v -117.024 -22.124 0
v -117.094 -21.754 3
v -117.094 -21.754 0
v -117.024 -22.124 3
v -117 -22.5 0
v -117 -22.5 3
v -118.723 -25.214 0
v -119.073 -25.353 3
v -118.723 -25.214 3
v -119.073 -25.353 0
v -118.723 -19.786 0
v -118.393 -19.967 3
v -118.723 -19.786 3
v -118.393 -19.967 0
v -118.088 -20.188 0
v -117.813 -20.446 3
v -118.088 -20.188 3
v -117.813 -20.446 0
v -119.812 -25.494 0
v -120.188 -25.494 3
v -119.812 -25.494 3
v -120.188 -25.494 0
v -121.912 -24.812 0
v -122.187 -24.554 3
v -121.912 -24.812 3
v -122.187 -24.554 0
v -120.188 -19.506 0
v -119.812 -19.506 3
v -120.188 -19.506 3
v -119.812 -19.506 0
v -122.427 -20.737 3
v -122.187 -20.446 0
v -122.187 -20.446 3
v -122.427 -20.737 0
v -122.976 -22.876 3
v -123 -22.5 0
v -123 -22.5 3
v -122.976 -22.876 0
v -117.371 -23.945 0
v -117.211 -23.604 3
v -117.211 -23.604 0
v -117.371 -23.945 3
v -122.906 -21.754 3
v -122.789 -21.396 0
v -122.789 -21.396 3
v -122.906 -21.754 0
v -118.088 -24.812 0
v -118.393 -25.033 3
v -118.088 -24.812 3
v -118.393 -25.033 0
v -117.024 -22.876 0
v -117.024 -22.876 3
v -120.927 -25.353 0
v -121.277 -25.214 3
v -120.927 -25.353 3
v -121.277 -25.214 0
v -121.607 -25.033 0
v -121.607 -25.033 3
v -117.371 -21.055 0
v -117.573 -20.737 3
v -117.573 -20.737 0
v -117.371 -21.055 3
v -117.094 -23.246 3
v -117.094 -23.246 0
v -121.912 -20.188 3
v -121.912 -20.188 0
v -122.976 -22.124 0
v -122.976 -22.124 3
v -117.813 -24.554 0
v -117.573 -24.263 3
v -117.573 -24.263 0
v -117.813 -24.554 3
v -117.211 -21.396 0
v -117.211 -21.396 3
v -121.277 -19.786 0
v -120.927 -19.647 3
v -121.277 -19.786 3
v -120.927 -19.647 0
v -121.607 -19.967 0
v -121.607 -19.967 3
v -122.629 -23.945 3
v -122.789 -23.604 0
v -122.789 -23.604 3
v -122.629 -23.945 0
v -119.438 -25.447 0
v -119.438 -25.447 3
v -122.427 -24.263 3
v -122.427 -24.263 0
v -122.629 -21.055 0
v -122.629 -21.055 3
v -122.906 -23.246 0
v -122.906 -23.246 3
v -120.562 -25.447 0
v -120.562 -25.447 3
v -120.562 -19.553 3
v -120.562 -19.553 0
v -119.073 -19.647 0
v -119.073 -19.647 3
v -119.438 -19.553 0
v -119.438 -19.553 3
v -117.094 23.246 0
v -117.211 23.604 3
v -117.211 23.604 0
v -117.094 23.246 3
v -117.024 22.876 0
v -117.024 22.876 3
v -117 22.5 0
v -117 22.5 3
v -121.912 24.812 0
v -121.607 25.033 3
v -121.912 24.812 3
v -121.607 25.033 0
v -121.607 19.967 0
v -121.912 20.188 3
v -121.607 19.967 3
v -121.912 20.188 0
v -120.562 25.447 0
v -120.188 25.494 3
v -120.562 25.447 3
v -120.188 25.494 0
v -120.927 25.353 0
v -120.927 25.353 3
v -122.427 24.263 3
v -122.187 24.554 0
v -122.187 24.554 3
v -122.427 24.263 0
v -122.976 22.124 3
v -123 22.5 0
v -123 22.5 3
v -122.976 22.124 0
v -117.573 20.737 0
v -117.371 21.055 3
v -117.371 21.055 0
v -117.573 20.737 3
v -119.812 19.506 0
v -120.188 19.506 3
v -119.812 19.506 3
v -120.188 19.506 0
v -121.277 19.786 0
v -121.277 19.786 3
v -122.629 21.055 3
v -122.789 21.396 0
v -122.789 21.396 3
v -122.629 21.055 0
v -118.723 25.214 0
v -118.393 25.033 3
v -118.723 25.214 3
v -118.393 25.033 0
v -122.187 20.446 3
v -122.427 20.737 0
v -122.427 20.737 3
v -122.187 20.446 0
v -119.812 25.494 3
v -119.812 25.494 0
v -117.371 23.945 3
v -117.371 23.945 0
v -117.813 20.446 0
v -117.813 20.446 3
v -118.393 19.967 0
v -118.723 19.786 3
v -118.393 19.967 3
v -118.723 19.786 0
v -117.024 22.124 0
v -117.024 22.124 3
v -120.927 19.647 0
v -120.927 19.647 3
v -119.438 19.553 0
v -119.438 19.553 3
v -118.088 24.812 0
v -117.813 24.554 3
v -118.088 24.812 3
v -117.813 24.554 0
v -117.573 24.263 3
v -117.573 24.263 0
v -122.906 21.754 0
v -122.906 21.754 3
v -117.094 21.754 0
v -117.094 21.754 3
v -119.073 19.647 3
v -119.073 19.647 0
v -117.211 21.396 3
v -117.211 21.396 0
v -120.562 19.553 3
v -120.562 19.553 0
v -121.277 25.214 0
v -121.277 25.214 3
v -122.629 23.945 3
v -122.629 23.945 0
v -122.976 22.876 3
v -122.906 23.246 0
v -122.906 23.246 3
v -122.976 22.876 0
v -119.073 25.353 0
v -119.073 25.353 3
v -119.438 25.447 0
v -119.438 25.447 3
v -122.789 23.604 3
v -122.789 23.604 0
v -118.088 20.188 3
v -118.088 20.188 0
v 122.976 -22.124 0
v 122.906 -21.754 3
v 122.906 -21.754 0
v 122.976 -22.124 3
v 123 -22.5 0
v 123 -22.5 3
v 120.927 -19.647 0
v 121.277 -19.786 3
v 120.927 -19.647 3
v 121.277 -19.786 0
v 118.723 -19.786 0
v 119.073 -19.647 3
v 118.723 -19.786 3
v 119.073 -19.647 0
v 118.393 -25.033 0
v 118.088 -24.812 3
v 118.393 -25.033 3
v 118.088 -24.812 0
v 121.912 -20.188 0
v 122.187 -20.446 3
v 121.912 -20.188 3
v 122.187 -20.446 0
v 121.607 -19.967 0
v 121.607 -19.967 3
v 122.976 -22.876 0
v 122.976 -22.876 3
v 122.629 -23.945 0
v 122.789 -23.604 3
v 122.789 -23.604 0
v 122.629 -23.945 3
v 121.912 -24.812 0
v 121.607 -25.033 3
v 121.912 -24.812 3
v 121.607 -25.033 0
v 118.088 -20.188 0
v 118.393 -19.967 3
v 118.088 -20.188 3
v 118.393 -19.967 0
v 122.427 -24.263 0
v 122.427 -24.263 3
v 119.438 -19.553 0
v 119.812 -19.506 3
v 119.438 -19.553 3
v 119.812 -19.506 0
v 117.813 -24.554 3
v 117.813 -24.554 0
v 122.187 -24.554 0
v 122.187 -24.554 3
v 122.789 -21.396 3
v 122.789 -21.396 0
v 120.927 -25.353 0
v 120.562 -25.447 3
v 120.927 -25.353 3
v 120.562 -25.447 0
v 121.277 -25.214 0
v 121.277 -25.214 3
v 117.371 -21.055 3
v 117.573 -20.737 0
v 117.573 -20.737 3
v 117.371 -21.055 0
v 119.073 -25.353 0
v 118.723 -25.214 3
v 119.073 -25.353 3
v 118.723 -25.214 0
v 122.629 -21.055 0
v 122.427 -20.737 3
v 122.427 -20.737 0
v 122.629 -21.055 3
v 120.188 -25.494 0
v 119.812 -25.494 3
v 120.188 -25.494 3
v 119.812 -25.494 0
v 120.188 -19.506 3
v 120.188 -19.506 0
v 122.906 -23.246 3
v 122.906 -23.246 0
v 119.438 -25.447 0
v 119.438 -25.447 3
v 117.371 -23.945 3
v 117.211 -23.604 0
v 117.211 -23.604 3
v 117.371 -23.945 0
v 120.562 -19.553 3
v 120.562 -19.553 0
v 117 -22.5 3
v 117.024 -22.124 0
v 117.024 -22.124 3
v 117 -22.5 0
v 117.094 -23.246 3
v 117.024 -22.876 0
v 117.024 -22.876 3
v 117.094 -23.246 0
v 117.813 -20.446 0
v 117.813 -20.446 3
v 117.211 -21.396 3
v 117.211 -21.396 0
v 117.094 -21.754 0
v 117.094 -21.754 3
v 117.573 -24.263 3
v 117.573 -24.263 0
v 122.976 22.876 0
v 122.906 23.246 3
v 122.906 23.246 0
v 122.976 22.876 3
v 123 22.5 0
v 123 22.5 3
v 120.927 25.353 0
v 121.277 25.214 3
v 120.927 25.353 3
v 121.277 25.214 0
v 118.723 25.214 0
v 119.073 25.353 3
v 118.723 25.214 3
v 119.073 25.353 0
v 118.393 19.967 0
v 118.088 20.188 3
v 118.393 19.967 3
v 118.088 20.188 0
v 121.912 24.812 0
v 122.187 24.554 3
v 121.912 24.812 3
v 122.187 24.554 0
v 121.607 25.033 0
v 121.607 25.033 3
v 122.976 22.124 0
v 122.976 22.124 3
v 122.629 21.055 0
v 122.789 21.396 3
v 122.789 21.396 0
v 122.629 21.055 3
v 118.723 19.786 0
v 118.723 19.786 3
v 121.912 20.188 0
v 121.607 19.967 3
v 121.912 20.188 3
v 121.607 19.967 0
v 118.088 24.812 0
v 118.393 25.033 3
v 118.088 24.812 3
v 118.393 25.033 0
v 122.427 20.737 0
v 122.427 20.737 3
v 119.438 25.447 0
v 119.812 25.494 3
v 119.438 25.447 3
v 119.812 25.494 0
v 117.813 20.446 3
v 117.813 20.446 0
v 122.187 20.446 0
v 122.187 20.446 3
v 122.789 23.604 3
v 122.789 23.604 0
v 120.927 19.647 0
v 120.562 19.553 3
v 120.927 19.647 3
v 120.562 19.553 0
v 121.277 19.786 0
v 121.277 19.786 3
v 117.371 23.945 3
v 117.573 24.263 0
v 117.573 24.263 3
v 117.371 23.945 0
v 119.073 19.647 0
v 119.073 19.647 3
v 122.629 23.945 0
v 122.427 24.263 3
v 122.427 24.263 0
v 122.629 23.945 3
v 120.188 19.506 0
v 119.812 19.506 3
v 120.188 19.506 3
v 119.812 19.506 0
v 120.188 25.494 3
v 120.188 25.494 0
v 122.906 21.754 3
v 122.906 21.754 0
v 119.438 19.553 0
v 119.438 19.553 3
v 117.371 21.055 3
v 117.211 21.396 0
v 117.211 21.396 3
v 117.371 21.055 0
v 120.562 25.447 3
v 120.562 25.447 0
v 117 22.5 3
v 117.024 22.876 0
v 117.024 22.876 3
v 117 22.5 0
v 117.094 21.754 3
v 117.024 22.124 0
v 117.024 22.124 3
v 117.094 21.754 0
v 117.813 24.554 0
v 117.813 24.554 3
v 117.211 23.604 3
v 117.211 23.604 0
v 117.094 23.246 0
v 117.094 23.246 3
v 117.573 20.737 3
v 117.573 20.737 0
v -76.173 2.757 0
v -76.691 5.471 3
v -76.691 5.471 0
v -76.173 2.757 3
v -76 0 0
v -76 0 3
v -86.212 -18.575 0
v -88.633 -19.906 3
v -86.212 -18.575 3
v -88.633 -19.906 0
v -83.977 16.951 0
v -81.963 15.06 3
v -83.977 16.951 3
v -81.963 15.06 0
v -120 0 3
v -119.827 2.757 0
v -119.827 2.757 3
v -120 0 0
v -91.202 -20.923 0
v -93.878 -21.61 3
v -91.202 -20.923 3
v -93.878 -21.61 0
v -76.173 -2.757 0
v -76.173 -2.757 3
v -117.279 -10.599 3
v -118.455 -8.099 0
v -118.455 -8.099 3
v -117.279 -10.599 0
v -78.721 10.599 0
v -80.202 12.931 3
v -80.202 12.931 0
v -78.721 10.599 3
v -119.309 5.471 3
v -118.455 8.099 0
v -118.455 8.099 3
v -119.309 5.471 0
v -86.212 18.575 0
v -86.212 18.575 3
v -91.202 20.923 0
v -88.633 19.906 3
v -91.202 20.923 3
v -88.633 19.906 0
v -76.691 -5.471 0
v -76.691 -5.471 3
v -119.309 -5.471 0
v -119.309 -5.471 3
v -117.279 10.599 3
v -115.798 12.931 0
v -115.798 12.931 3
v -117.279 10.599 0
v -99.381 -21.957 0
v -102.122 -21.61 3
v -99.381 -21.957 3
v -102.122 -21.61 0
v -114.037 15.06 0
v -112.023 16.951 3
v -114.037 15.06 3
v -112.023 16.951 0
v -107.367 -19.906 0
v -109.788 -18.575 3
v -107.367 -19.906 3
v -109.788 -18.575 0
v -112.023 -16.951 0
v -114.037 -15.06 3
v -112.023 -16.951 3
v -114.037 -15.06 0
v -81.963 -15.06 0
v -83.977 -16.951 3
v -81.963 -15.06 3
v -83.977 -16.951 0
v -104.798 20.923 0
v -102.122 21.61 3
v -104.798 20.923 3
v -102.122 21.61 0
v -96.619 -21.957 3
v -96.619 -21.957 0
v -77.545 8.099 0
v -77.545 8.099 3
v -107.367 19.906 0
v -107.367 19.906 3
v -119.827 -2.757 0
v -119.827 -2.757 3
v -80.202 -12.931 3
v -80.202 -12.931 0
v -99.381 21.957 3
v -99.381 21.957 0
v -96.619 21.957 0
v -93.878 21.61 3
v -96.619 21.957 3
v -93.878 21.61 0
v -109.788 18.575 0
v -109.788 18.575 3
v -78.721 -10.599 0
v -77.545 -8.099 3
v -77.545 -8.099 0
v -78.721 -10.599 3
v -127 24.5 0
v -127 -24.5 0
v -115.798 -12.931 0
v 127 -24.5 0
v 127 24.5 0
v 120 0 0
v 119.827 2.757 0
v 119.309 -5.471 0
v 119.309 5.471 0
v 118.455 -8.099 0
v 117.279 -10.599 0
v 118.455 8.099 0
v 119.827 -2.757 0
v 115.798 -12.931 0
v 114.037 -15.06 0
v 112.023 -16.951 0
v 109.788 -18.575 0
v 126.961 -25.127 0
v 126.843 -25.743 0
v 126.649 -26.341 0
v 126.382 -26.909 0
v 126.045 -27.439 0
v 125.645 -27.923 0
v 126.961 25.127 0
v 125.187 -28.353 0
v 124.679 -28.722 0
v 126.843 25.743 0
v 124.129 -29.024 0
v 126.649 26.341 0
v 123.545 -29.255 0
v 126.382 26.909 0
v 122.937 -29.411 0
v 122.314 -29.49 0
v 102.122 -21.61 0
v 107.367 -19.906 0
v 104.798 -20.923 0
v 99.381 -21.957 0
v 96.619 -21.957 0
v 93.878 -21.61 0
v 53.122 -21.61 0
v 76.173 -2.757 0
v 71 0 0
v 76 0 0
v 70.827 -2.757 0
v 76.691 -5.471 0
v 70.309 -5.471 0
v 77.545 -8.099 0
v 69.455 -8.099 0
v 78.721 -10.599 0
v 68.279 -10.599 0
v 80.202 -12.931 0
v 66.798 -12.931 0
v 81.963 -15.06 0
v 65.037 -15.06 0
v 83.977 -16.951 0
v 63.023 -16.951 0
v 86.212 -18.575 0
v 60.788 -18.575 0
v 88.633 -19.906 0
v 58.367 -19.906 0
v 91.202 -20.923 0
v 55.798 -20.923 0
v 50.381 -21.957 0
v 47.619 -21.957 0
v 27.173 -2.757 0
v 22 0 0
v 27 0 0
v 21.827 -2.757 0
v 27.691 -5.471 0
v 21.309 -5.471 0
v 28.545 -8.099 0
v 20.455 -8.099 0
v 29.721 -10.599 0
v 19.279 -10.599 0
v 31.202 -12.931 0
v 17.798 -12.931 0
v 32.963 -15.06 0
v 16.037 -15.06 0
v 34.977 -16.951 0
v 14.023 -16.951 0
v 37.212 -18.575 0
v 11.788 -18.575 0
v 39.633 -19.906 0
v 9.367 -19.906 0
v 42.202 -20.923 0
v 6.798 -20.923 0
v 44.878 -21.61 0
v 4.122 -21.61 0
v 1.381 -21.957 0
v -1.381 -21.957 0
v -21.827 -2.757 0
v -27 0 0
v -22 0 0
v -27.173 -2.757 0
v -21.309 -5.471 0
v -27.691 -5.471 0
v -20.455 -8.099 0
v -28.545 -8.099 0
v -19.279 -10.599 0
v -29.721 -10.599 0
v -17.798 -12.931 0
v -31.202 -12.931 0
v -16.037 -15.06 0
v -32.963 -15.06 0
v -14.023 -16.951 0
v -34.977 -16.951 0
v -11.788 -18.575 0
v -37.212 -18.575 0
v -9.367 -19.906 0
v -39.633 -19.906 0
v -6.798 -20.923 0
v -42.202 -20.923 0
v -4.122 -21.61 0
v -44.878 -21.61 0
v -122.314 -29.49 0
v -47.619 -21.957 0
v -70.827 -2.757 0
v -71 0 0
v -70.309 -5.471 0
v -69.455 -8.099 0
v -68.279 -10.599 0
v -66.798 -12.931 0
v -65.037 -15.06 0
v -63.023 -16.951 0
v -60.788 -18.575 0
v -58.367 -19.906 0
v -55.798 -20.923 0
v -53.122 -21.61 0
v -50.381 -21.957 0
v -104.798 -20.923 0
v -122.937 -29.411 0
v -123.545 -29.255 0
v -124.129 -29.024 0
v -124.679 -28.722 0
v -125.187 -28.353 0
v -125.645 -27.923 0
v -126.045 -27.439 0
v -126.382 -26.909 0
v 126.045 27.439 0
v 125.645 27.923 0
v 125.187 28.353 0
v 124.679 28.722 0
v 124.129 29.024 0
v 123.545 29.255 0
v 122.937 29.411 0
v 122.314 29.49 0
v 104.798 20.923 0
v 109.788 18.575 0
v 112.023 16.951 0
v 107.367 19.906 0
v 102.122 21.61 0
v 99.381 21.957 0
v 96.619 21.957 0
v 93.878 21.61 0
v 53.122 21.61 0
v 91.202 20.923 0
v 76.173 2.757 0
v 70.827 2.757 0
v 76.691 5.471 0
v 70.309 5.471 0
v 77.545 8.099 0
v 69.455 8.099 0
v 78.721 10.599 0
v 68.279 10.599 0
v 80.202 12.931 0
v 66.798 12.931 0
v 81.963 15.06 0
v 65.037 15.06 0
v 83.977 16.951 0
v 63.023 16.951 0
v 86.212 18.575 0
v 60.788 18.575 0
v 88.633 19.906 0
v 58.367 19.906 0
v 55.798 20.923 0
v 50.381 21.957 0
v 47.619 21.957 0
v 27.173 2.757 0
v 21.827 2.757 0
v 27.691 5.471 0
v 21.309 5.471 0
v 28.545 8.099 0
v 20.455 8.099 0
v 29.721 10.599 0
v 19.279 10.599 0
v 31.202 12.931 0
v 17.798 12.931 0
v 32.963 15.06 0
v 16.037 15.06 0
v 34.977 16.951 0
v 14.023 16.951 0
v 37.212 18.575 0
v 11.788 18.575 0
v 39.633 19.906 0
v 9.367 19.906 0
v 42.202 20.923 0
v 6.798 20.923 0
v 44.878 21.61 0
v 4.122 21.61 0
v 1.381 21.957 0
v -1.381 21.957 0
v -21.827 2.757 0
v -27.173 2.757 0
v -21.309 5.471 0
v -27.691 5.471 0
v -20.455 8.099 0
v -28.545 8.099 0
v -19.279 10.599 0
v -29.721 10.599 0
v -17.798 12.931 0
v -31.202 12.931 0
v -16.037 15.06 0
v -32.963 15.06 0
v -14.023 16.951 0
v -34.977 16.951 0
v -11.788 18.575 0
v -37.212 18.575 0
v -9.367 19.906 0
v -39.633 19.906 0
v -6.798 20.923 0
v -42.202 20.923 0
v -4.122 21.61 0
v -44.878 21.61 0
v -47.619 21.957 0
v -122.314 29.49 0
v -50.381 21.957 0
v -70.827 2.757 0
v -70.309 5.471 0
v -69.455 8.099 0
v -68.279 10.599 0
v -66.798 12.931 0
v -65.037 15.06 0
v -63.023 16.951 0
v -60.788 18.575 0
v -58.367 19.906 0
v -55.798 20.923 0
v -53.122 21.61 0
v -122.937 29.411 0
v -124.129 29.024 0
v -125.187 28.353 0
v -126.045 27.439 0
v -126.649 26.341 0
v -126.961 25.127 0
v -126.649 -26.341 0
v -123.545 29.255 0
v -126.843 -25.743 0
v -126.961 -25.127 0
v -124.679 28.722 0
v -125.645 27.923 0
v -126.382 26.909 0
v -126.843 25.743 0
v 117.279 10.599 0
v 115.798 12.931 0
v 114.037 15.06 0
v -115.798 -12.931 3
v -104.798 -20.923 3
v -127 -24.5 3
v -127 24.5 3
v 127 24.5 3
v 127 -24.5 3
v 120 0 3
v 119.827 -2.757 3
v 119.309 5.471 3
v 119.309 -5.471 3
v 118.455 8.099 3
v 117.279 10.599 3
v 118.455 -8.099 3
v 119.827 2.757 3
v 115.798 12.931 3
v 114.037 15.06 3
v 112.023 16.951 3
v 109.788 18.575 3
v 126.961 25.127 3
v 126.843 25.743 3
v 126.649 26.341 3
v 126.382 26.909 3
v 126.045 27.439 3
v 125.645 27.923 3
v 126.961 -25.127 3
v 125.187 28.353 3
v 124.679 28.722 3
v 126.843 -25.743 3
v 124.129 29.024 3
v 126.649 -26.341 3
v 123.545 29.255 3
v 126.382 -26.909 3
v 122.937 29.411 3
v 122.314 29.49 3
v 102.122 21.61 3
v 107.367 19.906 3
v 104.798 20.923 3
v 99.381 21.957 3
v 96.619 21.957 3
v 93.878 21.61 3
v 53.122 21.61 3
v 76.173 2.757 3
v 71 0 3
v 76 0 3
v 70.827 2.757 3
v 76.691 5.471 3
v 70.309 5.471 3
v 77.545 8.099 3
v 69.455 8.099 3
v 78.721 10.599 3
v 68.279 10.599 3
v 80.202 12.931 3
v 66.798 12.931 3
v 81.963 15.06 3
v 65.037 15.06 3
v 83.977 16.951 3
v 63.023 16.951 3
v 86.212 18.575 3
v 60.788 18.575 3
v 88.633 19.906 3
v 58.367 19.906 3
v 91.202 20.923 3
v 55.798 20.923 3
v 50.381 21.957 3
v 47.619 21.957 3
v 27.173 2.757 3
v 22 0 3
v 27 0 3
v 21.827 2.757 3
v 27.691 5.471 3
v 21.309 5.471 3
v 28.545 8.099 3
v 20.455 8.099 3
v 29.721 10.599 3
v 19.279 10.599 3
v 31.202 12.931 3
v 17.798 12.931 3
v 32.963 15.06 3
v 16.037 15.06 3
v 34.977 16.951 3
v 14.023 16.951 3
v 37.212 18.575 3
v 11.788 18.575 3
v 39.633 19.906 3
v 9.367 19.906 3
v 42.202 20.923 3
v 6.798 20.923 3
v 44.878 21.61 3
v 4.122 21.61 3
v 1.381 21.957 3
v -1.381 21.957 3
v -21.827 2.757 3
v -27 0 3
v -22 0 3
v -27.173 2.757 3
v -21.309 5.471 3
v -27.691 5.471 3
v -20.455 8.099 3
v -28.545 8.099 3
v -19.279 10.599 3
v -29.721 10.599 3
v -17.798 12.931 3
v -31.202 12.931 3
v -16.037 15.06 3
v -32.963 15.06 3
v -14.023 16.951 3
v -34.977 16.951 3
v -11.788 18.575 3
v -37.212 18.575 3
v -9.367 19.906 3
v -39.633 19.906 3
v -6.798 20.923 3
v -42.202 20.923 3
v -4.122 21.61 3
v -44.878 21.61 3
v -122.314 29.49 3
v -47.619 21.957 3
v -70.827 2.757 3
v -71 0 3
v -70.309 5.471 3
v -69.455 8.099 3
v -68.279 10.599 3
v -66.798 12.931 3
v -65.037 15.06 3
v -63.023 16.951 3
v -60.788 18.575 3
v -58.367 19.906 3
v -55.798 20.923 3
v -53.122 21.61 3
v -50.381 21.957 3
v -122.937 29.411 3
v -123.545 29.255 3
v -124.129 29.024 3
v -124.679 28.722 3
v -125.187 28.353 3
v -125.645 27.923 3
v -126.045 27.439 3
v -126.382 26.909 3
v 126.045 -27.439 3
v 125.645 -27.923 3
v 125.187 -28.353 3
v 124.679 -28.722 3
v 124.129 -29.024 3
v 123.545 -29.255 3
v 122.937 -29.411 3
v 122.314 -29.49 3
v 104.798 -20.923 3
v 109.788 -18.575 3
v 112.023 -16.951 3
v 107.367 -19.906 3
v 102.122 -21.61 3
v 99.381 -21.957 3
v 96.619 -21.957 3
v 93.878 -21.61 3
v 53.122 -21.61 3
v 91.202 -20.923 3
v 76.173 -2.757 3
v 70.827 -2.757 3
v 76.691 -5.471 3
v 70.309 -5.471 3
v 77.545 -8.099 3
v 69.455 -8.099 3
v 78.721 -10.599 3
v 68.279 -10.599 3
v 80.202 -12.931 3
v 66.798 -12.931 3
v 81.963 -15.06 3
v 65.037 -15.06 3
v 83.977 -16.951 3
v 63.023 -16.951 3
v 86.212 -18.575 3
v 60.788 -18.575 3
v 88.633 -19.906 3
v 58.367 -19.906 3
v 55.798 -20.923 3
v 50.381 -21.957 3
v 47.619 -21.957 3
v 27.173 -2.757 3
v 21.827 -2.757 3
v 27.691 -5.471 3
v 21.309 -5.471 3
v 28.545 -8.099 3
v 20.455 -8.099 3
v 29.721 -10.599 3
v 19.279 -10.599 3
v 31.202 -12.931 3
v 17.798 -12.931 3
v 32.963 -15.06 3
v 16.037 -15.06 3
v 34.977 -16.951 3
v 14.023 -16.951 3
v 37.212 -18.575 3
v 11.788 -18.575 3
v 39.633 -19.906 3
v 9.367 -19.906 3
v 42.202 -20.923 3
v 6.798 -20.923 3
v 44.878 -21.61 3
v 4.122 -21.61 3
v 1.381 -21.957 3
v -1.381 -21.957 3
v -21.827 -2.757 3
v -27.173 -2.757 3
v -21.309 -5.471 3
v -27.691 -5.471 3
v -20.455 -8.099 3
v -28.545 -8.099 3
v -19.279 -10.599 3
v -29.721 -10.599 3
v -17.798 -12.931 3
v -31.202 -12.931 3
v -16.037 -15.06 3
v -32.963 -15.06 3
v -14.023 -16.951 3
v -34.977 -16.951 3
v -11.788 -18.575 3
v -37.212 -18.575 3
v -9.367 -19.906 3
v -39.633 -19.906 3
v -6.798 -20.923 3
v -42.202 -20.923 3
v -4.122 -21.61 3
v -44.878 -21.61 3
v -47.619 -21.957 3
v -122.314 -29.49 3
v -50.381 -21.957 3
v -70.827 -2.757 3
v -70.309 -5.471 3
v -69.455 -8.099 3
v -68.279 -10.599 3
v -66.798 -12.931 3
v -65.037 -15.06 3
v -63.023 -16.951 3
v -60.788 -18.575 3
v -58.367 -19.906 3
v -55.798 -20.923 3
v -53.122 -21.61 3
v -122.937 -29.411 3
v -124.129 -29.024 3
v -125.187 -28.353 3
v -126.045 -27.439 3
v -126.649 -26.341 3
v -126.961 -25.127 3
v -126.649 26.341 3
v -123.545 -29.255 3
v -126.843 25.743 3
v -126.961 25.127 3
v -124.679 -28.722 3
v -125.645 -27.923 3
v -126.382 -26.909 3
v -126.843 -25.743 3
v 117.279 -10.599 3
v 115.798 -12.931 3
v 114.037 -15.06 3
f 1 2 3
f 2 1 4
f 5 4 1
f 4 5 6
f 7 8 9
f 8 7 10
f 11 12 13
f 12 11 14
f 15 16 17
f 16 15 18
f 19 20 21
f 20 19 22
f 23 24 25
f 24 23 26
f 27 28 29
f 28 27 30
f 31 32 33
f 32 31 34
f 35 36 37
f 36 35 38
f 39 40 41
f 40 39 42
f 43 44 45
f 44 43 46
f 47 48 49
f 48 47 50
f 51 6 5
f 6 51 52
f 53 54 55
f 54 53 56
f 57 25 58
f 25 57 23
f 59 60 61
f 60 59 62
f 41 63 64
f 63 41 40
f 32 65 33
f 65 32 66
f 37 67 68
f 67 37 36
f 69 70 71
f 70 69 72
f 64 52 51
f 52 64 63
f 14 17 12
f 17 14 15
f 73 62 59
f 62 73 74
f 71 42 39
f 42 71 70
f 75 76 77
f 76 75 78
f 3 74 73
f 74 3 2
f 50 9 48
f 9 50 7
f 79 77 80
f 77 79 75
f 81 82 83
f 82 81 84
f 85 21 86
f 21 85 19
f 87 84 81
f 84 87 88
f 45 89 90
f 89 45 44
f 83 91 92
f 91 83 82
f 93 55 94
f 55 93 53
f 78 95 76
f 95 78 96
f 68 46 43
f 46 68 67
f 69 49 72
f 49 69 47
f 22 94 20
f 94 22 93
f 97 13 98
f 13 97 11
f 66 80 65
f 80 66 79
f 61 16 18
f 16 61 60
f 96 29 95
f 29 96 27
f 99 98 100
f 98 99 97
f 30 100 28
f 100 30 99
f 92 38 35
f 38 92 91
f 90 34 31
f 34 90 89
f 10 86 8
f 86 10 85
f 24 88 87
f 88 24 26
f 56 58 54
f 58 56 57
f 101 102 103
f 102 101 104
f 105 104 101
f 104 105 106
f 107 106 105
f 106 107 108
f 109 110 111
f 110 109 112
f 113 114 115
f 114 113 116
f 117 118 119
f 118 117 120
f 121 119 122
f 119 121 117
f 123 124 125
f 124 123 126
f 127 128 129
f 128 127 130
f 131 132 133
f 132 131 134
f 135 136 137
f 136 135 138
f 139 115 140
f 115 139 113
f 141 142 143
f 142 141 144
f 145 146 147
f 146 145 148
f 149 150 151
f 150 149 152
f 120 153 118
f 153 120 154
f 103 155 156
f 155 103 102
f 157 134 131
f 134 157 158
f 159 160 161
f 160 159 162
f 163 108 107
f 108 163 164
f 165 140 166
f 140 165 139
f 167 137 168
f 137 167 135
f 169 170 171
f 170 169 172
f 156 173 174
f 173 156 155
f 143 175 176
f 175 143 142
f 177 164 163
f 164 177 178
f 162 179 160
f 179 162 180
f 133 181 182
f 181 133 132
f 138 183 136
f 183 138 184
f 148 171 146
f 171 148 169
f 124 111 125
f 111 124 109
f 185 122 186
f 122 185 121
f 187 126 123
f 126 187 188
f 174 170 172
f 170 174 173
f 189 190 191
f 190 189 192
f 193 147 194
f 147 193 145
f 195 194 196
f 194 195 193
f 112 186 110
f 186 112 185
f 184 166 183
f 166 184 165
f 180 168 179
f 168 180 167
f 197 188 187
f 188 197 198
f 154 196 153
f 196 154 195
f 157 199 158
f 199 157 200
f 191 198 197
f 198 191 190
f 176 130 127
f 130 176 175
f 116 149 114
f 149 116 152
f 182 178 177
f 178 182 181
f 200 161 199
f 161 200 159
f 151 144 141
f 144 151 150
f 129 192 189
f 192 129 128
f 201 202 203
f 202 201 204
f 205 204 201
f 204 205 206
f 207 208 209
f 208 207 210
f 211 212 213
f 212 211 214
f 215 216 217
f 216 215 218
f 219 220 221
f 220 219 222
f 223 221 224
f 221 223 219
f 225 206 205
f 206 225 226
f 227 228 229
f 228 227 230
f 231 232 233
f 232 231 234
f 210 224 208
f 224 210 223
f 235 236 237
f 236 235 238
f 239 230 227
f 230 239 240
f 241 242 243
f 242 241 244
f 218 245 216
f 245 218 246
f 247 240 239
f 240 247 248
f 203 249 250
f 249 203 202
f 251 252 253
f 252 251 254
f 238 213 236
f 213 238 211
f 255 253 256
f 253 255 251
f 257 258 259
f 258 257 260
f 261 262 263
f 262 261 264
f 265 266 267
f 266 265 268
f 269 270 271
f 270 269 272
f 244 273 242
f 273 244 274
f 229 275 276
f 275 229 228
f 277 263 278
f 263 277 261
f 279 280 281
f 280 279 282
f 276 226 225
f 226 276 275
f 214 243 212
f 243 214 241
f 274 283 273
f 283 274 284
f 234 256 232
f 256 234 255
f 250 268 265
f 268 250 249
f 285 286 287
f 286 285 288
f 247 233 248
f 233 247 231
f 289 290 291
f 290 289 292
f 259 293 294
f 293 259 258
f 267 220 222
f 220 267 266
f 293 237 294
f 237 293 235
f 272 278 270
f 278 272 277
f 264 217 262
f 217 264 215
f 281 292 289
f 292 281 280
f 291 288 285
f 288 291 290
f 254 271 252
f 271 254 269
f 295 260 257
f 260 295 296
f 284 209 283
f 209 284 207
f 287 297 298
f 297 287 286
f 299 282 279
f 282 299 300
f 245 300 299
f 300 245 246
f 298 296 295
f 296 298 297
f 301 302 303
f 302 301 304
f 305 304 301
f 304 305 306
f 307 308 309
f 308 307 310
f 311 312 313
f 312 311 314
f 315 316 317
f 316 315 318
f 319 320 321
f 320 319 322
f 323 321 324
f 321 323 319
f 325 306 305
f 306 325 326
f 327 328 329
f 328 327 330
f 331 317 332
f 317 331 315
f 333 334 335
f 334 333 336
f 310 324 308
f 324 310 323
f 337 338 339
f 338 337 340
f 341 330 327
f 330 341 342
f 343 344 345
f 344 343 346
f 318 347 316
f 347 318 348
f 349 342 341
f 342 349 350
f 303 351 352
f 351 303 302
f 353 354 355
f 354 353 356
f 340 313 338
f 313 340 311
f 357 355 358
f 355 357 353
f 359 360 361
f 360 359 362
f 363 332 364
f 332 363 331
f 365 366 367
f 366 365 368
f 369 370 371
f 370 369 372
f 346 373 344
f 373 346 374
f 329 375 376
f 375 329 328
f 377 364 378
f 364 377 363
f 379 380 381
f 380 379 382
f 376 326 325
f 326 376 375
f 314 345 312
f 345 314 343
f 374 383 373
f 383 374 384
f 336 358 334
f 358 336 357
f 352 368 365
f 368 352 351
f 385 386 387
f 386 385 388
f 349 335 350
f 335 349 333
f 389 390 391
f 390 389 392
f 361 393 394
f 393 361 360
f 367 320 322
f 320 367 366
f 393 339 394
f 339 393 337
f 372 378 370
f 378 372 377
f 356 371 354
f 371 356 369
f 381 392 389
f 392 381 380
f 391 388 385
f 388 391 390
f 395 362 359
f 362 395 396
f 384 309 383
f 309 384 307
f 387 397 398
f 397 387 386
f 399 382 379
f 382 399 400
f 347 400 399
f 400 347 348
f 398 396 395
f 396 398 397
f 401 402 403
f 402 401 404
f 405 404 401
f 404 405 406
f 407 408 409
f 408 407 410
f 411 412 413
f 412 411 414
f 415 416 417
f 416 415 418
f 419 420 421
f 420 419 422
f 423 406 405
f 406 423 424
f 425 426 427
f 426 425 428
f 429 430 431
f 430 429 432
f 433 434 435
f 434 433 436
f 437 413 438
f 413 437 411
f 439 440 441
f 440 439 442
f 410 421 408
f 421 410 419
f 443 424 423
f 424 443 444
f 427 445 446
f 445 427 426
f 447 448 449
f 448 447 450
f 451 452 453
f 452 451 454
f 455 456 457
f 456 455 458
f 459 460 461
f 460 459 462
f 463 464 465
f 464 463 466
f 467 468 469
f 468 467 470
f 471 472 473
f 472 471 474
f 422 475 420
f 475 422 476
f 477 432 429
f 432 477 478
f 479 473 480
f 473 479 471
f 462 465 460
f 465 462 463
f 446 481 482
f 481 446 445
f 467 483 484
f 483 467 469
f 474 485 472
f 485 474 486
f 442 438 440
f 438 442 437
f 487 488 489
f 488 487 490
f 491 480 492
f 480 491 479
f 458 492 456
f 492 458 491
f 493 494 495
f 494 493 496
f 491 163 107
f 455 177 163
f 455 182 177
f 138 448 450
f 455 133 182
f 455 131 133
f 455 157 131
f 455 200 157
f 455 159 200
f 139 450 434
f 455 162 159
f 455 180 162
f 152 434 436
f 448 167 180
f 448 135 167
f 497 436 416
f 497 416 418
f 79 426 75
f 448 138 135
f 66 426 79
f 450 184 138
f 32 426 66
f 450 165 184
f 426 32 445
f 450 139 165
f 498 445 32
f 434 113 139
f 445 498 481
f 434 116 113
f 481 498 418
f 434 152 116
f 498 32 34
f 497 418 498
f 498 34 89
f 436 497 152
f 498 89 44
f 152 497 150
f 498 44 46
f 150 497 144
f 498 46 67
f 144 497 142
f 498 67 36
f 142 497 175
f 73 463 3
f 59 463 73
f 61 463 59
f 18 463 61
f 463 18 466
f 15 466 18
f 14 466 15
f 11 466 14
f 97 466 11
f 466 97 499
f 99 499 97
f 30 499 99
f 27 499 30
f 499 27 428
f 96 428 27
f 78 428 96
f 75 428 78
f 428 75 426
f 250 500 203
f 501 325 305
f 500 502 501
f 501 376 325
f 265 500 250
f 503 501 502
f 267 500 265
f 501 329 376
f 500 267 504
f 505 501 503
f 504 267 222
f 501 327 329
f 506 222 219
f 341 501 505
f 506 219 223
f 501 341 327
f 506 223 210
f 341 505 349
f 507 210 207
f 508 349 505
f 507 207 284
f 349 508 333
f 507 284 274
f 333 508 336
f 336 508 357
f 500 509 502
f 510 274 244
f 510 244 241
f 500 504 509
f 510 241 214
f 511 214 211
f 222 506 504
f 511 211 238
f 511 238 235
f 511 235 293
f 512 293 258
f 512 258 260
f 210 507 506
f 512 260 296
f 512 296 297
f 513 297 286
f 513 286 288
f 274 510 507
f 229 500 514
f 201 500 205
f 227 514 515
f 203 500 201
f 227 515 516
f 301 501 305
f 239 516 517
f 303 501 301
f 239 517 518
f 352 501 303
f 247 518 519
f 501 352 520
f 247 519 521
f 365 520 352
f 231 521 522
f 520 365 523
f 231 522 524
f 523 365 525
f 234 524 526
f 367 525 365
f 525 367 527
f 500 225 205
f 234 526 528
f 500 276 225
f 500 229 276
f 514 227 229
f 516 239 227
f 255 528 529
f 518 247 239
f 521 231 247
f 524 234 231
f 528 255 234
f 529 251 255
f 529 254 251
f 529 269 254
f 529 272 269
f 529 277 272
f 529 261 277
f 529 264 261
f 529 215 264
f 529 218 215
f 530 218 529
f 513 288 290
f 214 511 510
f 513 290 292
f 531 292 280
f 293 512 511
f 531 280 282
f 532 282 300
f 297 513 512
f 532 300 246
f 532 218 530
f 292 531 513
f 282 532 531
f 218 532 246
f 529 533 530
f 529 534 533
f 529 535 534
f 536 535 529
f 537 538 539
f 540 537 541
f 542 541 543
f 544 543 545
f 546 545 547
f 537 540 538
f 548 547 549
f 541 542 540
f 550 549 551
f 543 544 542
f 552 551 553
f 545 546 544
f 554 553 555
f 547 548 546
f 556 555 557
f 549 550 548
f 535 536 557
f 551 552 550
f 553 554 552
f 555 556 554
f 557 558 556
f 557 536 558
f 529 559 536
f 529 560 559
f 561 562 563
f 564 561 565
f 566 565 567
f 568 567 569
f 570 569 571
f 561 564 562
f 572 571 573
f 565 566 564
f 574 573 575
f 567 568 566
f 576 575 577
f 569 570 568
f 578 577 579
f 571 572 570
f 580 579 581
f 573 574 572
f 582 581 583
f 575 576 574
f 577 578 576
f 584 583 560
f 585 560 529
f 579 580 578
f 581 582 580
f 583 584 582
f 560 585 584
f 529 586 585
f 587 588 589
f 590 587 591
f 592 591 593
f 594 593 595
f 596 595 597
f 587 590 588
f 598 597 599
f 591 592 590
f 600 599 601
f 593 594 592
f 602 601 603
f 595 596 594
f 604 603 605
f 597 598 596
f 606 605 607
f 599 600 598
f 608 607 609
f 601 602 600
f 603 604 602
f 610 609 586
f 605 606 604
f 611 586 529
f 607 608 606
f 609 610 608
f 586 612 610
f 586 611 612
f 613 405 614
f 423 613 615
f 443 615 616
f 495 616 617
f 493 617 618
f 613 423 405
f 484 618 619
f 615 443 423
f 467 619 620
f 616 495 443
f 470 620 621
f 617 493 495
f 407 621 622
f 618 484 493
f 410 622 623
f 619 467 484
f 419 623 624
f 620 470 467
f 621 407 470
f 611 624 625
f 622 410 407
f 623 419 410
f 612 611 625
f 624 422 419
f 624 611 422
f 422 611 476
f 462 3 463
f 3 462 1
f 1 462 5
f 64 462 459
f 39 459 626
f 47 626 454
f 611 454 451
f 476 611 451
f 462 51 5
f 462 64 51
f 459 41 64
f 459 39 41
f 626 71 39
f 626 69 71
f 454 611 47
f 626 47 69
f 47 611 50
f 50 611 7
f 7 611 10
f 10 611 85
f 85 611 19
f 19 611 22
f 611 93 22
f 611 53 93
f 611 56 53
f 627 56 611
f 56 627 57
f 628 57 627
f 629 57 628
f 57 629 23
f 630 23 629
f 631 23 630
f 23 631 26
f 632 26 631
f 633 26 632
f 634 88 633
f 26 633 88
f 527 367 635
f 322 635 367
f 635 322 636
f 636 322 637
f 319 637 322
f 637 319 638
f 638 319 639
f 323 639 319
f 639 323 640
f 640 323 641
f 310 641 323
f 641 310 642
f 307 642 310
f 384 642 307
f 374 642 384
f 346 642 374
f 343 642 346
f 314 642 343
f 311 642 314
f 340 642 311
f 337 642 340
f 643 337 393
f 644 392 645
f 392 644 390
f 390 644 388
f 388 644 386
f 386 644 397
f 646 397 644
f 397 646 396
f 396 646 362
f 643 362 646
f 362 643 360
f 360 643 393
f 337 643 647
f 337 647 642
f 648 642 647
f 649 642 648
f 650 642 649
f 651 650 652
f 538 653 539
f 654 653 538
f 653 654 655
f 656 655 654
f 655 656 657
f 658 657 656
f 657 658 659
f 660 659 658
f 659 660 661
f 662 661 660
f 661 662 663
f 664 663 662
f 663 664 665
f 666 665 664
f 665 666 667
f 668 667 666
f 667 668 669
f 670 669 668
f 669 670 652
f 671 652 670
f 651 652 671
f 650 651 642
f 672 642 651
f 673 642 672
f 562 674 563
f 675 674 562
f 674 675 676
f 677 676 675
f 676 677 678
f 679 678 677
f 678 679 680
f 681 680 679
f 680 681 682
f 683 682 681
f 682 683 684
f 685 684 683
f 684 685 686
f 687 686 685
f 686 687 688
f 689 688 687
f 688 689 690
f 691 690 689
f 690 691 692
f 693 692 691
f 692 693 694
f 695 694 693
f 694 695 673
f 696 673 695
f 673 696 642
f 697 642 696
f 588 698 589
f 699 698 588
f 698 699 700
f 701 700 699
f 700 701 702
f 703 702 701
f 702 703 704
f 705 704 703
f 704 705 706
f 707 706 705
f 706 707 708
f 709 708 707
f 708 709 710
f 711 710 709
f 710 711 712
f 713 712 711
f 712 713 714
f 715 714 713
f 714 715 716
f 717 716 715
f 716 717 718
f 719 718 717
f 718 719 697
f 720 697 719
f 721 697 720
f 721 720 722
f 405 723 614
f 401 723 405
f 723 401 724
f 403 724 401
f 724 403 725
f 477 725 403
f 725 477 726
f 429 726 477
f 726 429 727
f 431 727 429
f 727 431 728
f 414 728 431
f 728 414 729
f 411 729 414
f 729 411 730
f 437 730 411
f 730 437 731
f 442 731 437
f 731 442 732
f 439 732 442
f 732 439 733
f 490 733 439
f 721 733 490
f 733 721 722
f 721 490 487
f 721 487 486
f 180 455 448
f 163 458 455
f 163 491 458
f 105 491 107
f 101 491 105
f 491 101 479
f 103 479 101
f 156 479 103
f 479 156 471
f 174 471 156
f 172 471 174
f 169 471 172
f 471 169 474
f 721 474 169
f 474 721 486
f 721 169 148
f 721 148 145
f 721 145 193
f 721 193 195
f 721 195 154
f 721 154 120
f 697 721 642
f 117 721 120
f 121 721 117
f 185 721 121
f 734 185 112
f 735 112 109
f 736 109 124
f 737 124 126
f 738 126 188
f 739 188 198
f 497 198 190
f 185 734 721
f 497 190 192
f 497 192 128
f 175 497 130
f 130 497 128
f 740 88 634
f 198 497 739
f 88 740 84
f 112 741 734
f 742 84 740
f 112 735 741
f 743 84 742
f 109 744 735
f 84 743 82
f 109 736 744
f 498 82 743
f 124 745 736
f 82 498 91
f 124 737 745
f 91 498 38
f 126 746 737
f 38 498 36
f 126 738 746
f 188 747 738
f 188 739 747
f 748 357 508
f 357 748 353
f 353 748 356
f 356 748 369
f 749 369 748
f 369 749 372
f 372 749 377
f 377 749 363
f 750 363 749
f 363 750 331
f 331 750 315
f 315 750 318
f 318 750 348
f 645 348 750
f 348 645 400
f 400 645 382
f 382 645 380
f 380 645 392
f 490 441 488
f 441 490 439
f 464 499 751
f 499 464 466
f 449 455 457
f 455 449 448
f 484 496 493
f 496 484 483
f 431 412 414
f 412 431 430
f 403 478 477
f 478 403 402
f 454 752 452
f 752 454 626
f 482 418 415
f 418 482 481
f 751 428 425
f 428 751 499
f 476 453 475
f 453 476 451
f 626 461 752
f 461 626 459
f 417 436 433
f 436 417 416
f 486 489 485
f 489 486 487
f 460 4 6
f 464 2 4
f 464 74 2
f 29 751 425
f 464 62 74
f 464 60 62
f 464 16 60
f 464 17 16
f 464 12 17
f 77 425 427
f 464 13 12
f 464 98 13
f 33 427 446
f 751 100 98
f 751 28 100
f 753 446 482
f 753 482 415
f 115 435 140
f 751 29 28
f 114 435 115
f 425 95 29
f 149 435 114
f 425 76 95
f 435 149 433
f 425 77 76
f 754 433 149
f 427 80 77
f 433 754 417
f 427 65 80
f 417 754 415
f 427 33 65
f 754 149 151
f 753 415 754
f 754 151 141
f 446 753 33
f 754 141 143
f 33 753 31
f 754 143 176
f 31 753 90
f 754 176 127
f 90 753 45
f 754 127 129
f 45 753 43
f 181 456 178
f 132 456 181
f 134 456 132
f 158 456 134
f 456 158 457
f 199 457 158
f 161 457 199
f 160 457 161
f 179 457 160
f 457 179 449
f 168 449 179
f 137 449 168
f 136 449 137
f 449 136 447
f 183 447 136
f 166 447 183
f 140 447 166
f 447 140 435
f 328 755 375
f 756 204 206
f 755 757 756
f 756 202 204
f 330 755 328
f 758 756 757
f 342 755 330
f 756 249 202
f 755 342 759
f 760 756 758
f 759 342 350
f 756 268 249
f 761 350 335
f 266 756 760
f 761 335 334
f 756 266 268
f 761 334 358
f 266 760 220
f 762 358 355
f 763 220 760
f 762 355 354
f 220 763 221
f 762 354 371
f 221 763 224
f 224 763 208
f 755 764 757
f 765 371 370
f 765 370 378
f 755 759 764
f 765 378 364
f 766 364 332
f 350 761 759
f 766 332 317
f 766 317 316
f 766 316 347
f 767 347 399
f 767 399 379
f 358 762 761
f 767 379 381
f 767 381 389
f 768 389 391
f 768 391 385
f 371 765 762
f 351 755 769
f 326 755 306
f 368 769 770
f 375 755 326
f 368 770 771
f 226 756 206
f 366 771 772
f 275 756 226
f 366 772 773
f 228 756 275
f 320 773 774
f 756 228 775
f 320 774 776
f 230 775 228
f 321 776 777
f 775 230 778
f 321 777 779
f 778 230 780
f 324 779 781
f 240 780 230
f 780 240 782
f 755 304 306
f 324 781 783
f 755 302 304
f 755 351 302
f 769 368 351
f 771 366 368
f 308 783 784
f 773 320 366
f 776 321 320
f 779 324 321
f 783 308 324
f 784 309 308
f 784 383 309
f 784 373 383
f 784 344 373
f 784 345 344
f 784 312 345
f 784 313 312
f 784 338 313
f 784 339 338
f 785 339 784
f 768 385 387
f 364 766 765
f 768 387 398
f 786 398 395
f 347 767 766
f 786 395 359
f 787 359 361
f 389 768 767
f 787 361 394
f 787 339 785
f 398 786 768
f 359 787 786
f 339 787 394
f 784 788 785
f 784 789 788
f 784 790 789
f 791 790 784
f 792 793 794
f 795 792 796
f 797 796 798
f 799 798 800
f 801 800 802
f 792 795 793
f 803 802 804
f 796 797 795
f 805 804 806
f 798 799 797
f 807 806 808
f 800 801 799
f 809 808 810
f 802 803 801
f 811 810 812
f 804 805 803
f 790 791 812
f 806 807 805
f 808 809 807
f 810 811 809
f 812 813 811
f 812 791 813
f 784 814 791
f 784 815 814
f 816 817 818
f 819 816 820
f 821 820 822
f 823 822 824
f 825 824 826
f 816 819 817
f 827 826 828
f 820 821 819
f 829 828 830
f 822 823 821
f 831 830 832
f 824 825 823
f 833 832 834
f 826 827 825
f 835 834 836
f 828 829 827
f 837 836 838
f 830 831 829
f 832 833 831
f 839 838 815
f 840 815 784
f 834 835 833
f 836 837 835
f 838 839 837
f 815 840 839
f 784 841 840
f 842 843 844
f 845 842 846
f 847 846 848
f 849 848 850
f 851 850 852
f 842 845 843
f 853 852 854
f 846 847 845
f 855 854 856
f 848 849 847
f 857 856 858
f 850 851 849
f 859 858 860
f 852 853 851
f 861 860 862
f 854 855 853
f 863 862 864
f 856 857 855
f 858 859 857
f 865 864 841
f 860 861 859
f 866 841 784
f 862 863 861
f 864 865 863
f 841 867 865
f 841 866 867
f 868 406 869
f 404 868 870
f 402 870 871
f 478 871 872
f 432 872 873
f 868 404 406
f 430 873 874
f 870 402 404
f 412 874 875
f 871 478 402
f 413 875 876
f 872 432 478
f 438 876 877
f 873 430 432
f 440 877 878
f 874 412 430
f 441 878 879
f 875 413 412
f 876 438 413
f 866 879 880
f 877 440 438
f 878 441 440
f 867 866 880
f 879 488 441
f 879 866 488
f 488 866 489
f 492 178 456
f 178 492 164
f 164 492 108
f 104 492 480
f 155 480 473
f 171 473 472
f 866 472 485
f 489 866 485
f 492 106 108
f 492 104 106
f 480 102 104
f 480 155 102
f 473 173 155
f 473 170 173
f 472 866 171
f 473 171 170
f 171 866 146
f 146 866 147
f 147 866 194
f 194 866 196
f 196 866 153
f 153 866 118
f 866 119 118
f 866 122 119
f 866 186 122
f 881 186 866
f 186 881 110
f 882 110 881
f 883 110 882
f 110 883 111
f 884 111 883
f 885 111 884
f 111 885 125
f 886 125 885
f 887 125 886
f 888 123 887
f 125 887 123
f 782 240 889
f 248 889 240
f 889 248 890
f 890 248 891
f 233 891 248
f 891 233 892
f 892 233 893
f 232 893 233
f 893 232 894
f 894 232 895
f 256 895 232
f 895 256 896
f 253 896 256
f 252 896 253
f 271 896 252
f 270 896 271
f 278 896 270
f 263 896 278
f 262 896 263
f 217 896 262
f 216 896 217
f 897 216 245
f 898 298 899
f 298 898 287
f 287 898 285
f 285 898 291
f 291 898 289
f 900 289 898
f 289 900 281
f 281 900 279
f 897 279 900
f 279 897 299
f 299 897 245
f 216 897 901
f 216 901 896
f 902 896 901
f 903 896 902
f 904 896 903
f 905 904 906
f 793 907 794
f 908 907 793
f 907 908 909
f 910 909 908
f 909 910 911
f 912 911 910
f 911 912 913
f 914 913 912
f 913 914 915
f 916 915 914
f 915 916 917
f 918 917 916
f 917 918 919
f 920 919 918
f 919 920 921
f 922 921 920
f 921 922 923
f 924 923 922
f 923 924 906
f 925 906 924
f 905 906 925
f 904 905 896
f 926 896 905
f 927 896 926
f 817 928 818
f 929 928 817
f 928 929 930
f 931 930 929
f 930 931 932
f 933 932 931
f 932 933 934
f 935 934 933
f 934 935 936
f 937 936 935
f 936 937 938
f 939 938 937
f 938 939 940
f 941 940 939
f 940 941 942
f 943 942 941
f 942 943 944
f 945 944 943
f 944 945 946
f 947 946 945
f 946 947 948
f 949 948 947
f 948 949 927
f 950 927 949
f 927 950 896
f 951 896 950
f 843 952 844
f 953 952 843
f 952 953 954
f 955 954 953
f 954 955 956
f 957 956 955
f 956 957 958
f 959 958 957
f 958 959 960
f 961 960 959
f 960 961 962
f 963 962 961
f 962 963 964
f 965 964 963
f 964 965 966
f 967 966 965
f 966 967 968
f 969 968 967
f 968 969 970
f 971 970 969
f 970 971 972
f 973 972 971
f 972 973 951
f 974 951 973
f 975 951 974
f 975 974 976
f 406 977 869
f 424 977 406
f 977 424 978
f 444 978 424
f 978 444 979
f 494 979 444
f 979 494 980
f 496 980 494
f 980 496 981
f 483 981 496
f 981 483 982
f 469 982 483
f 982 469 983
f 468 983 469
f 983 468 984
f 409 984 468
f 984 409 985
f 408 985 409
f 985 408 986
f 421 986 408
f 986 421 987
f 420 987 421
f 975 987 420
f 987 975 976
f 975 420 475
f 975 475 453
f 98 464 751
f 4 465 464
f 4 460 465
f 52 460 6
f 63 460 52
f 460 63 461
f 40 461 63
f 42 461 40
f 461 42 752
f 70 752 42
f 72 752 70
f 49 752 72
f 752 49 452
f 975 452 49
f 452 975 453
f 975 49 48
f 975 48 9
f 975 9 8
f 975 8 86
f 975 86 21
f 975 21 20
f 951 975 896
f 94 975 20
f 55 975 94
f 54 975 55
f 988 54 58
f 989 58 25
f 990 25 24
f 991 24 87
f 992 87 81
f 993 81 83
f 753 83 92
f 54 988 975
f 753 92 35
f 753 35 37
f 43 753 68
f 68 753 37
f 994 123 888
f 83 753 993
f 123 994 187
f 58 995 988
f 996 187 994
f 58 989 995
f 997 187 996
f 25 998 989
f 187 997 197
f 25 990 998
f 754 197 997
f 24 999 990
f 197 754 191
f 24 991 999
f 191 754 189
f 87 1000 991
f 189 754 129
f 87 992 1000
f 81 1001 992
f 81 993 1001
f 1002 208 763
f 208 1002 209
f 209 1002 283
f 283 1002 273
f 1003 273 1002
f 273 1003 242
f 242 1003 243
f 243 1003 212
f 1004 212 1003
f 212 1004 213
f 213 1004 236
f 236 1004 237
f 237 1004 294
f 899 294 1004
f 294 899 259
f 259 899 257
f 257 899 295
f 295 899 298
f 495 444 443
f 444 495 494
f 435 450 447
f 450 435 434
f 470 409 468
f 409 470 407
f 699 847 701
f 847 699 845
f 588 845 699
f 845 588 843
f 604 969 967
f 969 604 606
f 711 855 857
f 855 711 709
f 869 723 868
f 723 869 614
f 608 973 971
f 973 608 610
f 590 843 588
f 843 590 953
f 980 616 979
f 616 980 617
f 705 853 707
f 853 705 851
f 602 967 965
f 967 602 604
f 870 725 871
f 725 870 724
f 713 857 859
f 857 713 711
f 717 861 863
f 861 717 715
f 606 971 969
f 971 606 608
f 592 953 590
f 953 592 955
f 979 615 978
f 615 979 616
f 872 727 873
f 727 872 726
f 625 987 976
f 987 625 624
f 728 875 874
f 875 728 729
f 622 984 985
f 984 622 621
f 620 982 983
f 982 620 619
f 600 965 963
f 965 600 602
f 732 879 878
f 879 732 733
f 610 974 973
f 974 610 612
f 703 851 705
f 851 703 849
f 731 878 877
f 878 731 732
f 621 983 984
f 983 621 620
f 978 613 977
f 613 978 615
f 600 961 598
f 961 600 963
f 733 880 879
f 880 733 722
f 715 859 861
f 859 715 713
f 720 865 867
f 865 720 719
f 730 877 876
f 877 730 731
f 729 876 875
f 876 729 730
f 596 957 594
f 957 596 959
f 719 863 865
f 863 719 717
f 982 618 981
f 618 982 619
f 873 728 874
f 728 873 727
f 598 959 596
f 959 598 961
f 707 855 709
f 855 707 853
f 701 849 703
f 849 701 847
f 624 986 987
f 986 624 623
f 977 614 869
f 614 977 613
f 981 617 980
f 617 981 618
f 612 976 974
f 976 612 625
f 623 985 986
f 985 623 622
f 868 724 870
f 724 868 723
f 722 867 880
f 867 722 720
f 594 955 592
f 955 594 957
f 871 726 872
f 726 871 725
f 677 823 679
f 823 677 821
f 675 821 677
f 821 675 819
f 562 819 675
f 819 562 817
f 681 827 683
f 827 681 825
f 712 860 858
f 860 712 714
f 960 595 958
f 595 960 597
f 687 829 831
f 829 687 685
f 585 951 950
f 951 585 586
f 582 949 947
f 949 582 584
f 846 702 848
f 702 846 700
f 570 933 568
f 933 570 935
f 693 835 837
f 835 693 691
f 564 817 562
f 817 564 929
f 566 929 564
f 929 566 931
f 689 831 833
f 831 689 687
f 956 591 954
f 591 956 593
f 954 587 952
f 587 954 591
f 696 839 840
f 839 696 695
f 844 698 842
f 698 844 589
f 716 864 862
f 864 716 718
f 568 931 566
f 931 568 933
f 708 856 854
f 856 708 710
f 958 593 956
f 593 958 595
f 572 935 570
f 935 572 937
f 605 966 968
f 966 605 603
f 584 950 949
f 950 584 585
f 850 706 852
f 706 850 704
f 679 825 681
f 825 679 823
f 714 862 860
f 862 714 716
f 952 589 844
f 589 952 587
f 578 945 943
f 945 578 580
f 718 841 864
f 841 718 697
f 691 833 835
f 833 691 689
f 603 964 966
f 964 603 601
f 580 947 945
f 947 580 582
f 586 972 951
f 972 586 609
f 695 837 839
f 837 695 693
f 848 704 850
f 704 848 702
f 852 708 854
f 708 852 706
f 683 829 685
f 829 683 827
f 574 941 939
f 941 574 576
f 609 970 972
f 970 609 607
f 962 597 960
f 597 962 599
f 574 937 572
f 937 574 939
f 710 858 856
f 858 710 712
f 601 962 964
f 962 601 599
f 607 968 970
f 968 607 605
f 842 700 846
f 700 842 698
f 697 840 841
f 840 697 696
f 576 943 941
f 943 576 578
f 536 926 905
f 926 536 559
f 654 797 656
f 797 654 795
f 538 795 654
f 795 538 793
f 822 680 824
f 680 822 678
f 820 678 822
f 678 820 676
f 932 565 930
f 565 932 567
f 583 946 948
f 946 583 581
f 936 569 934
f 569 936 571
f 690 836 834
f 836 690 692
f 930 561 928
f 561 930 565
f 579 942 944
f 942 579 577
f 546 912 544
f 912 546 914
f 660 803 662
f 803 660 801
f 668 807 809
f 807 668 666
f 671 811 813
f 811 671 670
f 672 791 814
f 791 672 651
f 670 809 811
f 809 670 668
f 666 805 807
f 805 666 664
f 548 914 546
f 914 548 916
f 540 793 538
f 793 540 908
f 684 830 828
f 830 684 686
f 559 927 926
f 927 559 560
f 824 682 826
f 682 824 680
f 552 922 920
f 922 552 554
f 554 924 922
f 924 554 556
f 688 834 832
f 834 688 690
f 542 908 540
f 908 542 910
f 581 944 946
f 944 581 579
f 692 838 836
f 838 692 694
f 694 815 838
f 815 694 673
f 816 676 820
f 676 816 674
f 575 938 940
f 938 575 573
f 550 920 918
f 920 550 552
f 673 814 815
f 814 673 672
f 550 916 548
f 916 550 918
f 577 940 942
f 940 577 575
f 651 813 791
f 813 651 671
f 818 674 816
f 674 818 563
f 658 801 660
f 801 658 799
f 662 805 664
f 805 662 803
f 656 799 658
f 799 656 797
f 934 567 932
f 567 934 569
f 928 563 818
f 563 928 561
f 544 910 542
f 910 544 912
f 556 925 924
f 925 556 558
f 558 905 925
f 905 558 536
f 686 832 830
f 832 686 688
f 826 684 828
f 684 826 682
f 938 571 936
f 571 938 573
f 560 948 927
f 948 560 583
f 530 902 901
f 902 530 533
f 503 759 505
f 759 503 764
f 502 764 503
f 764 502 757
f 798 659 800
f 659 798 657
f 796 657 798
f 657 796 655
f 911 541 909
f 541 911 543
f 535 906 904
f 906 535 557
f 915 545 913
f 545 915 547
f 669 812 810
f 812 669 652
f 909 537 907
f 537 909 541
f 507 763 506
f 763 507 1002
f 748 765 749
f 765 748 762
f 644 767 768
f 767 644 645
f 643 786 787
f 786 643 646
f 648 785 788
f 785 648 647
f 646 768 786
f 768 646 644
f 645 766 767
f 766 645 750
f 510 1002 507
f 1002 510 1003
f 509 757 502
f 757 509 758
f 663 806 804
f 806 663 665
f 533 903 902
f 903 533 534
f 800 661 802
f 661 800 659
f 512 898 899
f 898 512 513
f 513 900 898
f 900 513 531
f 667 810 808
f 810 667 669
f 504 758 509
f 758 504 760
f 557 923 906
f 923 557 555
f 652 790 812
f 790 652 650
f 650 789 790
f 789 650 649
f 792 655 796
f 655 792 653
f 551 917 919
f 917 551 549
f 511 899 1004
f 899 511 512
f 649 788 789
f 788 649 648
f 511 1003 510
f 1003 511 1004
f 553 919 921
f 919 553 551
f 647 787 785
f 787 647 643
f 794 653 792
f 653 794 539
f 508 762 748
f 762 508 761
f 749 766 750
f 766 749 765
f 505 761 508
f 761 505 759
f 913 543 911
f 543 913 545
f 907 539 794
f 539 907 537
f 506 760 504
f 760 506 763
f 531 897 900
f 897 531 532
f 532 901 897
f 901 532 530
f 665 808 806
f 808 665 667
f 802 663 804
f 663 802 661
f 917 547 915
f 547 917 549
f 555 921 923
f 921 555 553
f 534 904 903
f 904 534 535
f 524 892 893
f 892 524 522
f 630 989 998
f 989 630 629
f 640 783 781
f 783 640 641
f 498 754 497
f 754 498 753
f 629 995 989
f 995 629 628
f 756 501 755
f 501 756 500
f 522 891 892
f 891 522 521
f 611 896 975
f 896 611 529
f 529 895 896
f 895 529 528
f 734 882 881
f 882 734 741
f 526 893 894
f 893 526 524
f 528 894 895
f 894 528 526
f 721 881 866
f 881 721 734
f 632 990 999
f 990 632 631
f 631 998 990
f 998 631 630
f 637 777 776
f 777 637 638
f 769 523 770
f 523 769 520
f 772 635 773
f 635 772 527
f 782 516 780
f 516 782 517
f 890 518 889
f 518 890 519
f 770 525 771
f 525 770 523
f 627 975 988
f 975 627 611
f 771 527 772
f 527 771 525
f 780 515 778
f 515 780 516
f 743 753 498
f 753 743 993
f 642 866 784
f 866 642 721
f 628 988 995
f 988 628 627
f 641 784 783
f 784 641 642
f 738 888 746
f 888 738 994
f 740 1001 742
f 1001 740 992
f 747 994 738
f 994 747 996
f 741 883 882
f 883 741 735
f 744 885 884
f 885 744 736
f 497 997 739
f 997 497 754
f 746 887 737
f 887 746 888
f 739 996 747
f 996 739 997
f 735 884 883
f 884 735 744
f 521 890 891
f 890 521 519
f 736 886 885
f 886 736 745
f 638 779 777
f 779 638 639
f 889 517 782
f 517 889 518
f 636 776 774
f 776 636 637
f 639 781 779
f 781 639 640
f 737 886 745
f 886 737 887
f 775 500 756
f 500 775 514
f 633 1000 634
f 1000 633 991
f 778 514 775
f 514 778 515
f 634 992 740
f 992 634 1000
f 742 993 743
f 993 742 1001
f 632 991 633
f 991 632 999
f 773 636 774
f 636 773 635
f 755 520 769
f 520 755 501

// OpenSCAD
$fn = 50;


difference() {
	union() {
		hull() {
			translate(v = [-122.0000000000, 24.5000000000, 0]) {
				cylinder(h = 3, r = 5);
			}
			translate(v = [122.0000000000, 24.5000000000, 0]) {
				cylinder(h = 3, r = 5);
			}
			translate(v = [-122.0000000000, -24.5000000000, 0]) {
				cylinder(h = 3, r = 5);
			}
			translate(v = [122.0000000000, -24.5000000000, 0]) {
				cylinder(h = 3, r = 5);
			}
		}
	}
	union() {
		#translate(v = [-120.0000000000, -22.5000000000, -100.0000000000]) {
			cylinder(h = 200, r = 3.0000000000);
		}
		#translate(v = [-120.0000000000, 22.5000000000, -100.0000000000]) {
			cylinder(h = 200, r = 3.0000000000);
		}
		#translate(v = [120.0000000000, -22.5000000000, -100.0000000000]) {
			cylinder(h = 200, r = 3.0000000000);
		}
		#translate(v = [120.0000000000, 22.5000000000, -100.0000000000]) {
			cylinder(h = 200, r = 3.0000000000);
		}
		#translate(v = [-98.0000000000, 0, 0]) {
			cylinder(h = 3, r = 22.0000000000);
		}
		#translate(v = [-49.0000000000, 0, 0]) {
			cylinder(h = 3, r = 22.0000000000);
		}
		#cylinder(h = 3, r = 22.0000000000);
		#translate(v = [49.0000000000, 0, 0]) {
			cylinder(h = 3, r = 22.0000000000);
		}
		#translate(v = [98.0000000000, 0, 0]) {
			cylinder(h = 3, r = 22.0000000000);
		}
	}
}
